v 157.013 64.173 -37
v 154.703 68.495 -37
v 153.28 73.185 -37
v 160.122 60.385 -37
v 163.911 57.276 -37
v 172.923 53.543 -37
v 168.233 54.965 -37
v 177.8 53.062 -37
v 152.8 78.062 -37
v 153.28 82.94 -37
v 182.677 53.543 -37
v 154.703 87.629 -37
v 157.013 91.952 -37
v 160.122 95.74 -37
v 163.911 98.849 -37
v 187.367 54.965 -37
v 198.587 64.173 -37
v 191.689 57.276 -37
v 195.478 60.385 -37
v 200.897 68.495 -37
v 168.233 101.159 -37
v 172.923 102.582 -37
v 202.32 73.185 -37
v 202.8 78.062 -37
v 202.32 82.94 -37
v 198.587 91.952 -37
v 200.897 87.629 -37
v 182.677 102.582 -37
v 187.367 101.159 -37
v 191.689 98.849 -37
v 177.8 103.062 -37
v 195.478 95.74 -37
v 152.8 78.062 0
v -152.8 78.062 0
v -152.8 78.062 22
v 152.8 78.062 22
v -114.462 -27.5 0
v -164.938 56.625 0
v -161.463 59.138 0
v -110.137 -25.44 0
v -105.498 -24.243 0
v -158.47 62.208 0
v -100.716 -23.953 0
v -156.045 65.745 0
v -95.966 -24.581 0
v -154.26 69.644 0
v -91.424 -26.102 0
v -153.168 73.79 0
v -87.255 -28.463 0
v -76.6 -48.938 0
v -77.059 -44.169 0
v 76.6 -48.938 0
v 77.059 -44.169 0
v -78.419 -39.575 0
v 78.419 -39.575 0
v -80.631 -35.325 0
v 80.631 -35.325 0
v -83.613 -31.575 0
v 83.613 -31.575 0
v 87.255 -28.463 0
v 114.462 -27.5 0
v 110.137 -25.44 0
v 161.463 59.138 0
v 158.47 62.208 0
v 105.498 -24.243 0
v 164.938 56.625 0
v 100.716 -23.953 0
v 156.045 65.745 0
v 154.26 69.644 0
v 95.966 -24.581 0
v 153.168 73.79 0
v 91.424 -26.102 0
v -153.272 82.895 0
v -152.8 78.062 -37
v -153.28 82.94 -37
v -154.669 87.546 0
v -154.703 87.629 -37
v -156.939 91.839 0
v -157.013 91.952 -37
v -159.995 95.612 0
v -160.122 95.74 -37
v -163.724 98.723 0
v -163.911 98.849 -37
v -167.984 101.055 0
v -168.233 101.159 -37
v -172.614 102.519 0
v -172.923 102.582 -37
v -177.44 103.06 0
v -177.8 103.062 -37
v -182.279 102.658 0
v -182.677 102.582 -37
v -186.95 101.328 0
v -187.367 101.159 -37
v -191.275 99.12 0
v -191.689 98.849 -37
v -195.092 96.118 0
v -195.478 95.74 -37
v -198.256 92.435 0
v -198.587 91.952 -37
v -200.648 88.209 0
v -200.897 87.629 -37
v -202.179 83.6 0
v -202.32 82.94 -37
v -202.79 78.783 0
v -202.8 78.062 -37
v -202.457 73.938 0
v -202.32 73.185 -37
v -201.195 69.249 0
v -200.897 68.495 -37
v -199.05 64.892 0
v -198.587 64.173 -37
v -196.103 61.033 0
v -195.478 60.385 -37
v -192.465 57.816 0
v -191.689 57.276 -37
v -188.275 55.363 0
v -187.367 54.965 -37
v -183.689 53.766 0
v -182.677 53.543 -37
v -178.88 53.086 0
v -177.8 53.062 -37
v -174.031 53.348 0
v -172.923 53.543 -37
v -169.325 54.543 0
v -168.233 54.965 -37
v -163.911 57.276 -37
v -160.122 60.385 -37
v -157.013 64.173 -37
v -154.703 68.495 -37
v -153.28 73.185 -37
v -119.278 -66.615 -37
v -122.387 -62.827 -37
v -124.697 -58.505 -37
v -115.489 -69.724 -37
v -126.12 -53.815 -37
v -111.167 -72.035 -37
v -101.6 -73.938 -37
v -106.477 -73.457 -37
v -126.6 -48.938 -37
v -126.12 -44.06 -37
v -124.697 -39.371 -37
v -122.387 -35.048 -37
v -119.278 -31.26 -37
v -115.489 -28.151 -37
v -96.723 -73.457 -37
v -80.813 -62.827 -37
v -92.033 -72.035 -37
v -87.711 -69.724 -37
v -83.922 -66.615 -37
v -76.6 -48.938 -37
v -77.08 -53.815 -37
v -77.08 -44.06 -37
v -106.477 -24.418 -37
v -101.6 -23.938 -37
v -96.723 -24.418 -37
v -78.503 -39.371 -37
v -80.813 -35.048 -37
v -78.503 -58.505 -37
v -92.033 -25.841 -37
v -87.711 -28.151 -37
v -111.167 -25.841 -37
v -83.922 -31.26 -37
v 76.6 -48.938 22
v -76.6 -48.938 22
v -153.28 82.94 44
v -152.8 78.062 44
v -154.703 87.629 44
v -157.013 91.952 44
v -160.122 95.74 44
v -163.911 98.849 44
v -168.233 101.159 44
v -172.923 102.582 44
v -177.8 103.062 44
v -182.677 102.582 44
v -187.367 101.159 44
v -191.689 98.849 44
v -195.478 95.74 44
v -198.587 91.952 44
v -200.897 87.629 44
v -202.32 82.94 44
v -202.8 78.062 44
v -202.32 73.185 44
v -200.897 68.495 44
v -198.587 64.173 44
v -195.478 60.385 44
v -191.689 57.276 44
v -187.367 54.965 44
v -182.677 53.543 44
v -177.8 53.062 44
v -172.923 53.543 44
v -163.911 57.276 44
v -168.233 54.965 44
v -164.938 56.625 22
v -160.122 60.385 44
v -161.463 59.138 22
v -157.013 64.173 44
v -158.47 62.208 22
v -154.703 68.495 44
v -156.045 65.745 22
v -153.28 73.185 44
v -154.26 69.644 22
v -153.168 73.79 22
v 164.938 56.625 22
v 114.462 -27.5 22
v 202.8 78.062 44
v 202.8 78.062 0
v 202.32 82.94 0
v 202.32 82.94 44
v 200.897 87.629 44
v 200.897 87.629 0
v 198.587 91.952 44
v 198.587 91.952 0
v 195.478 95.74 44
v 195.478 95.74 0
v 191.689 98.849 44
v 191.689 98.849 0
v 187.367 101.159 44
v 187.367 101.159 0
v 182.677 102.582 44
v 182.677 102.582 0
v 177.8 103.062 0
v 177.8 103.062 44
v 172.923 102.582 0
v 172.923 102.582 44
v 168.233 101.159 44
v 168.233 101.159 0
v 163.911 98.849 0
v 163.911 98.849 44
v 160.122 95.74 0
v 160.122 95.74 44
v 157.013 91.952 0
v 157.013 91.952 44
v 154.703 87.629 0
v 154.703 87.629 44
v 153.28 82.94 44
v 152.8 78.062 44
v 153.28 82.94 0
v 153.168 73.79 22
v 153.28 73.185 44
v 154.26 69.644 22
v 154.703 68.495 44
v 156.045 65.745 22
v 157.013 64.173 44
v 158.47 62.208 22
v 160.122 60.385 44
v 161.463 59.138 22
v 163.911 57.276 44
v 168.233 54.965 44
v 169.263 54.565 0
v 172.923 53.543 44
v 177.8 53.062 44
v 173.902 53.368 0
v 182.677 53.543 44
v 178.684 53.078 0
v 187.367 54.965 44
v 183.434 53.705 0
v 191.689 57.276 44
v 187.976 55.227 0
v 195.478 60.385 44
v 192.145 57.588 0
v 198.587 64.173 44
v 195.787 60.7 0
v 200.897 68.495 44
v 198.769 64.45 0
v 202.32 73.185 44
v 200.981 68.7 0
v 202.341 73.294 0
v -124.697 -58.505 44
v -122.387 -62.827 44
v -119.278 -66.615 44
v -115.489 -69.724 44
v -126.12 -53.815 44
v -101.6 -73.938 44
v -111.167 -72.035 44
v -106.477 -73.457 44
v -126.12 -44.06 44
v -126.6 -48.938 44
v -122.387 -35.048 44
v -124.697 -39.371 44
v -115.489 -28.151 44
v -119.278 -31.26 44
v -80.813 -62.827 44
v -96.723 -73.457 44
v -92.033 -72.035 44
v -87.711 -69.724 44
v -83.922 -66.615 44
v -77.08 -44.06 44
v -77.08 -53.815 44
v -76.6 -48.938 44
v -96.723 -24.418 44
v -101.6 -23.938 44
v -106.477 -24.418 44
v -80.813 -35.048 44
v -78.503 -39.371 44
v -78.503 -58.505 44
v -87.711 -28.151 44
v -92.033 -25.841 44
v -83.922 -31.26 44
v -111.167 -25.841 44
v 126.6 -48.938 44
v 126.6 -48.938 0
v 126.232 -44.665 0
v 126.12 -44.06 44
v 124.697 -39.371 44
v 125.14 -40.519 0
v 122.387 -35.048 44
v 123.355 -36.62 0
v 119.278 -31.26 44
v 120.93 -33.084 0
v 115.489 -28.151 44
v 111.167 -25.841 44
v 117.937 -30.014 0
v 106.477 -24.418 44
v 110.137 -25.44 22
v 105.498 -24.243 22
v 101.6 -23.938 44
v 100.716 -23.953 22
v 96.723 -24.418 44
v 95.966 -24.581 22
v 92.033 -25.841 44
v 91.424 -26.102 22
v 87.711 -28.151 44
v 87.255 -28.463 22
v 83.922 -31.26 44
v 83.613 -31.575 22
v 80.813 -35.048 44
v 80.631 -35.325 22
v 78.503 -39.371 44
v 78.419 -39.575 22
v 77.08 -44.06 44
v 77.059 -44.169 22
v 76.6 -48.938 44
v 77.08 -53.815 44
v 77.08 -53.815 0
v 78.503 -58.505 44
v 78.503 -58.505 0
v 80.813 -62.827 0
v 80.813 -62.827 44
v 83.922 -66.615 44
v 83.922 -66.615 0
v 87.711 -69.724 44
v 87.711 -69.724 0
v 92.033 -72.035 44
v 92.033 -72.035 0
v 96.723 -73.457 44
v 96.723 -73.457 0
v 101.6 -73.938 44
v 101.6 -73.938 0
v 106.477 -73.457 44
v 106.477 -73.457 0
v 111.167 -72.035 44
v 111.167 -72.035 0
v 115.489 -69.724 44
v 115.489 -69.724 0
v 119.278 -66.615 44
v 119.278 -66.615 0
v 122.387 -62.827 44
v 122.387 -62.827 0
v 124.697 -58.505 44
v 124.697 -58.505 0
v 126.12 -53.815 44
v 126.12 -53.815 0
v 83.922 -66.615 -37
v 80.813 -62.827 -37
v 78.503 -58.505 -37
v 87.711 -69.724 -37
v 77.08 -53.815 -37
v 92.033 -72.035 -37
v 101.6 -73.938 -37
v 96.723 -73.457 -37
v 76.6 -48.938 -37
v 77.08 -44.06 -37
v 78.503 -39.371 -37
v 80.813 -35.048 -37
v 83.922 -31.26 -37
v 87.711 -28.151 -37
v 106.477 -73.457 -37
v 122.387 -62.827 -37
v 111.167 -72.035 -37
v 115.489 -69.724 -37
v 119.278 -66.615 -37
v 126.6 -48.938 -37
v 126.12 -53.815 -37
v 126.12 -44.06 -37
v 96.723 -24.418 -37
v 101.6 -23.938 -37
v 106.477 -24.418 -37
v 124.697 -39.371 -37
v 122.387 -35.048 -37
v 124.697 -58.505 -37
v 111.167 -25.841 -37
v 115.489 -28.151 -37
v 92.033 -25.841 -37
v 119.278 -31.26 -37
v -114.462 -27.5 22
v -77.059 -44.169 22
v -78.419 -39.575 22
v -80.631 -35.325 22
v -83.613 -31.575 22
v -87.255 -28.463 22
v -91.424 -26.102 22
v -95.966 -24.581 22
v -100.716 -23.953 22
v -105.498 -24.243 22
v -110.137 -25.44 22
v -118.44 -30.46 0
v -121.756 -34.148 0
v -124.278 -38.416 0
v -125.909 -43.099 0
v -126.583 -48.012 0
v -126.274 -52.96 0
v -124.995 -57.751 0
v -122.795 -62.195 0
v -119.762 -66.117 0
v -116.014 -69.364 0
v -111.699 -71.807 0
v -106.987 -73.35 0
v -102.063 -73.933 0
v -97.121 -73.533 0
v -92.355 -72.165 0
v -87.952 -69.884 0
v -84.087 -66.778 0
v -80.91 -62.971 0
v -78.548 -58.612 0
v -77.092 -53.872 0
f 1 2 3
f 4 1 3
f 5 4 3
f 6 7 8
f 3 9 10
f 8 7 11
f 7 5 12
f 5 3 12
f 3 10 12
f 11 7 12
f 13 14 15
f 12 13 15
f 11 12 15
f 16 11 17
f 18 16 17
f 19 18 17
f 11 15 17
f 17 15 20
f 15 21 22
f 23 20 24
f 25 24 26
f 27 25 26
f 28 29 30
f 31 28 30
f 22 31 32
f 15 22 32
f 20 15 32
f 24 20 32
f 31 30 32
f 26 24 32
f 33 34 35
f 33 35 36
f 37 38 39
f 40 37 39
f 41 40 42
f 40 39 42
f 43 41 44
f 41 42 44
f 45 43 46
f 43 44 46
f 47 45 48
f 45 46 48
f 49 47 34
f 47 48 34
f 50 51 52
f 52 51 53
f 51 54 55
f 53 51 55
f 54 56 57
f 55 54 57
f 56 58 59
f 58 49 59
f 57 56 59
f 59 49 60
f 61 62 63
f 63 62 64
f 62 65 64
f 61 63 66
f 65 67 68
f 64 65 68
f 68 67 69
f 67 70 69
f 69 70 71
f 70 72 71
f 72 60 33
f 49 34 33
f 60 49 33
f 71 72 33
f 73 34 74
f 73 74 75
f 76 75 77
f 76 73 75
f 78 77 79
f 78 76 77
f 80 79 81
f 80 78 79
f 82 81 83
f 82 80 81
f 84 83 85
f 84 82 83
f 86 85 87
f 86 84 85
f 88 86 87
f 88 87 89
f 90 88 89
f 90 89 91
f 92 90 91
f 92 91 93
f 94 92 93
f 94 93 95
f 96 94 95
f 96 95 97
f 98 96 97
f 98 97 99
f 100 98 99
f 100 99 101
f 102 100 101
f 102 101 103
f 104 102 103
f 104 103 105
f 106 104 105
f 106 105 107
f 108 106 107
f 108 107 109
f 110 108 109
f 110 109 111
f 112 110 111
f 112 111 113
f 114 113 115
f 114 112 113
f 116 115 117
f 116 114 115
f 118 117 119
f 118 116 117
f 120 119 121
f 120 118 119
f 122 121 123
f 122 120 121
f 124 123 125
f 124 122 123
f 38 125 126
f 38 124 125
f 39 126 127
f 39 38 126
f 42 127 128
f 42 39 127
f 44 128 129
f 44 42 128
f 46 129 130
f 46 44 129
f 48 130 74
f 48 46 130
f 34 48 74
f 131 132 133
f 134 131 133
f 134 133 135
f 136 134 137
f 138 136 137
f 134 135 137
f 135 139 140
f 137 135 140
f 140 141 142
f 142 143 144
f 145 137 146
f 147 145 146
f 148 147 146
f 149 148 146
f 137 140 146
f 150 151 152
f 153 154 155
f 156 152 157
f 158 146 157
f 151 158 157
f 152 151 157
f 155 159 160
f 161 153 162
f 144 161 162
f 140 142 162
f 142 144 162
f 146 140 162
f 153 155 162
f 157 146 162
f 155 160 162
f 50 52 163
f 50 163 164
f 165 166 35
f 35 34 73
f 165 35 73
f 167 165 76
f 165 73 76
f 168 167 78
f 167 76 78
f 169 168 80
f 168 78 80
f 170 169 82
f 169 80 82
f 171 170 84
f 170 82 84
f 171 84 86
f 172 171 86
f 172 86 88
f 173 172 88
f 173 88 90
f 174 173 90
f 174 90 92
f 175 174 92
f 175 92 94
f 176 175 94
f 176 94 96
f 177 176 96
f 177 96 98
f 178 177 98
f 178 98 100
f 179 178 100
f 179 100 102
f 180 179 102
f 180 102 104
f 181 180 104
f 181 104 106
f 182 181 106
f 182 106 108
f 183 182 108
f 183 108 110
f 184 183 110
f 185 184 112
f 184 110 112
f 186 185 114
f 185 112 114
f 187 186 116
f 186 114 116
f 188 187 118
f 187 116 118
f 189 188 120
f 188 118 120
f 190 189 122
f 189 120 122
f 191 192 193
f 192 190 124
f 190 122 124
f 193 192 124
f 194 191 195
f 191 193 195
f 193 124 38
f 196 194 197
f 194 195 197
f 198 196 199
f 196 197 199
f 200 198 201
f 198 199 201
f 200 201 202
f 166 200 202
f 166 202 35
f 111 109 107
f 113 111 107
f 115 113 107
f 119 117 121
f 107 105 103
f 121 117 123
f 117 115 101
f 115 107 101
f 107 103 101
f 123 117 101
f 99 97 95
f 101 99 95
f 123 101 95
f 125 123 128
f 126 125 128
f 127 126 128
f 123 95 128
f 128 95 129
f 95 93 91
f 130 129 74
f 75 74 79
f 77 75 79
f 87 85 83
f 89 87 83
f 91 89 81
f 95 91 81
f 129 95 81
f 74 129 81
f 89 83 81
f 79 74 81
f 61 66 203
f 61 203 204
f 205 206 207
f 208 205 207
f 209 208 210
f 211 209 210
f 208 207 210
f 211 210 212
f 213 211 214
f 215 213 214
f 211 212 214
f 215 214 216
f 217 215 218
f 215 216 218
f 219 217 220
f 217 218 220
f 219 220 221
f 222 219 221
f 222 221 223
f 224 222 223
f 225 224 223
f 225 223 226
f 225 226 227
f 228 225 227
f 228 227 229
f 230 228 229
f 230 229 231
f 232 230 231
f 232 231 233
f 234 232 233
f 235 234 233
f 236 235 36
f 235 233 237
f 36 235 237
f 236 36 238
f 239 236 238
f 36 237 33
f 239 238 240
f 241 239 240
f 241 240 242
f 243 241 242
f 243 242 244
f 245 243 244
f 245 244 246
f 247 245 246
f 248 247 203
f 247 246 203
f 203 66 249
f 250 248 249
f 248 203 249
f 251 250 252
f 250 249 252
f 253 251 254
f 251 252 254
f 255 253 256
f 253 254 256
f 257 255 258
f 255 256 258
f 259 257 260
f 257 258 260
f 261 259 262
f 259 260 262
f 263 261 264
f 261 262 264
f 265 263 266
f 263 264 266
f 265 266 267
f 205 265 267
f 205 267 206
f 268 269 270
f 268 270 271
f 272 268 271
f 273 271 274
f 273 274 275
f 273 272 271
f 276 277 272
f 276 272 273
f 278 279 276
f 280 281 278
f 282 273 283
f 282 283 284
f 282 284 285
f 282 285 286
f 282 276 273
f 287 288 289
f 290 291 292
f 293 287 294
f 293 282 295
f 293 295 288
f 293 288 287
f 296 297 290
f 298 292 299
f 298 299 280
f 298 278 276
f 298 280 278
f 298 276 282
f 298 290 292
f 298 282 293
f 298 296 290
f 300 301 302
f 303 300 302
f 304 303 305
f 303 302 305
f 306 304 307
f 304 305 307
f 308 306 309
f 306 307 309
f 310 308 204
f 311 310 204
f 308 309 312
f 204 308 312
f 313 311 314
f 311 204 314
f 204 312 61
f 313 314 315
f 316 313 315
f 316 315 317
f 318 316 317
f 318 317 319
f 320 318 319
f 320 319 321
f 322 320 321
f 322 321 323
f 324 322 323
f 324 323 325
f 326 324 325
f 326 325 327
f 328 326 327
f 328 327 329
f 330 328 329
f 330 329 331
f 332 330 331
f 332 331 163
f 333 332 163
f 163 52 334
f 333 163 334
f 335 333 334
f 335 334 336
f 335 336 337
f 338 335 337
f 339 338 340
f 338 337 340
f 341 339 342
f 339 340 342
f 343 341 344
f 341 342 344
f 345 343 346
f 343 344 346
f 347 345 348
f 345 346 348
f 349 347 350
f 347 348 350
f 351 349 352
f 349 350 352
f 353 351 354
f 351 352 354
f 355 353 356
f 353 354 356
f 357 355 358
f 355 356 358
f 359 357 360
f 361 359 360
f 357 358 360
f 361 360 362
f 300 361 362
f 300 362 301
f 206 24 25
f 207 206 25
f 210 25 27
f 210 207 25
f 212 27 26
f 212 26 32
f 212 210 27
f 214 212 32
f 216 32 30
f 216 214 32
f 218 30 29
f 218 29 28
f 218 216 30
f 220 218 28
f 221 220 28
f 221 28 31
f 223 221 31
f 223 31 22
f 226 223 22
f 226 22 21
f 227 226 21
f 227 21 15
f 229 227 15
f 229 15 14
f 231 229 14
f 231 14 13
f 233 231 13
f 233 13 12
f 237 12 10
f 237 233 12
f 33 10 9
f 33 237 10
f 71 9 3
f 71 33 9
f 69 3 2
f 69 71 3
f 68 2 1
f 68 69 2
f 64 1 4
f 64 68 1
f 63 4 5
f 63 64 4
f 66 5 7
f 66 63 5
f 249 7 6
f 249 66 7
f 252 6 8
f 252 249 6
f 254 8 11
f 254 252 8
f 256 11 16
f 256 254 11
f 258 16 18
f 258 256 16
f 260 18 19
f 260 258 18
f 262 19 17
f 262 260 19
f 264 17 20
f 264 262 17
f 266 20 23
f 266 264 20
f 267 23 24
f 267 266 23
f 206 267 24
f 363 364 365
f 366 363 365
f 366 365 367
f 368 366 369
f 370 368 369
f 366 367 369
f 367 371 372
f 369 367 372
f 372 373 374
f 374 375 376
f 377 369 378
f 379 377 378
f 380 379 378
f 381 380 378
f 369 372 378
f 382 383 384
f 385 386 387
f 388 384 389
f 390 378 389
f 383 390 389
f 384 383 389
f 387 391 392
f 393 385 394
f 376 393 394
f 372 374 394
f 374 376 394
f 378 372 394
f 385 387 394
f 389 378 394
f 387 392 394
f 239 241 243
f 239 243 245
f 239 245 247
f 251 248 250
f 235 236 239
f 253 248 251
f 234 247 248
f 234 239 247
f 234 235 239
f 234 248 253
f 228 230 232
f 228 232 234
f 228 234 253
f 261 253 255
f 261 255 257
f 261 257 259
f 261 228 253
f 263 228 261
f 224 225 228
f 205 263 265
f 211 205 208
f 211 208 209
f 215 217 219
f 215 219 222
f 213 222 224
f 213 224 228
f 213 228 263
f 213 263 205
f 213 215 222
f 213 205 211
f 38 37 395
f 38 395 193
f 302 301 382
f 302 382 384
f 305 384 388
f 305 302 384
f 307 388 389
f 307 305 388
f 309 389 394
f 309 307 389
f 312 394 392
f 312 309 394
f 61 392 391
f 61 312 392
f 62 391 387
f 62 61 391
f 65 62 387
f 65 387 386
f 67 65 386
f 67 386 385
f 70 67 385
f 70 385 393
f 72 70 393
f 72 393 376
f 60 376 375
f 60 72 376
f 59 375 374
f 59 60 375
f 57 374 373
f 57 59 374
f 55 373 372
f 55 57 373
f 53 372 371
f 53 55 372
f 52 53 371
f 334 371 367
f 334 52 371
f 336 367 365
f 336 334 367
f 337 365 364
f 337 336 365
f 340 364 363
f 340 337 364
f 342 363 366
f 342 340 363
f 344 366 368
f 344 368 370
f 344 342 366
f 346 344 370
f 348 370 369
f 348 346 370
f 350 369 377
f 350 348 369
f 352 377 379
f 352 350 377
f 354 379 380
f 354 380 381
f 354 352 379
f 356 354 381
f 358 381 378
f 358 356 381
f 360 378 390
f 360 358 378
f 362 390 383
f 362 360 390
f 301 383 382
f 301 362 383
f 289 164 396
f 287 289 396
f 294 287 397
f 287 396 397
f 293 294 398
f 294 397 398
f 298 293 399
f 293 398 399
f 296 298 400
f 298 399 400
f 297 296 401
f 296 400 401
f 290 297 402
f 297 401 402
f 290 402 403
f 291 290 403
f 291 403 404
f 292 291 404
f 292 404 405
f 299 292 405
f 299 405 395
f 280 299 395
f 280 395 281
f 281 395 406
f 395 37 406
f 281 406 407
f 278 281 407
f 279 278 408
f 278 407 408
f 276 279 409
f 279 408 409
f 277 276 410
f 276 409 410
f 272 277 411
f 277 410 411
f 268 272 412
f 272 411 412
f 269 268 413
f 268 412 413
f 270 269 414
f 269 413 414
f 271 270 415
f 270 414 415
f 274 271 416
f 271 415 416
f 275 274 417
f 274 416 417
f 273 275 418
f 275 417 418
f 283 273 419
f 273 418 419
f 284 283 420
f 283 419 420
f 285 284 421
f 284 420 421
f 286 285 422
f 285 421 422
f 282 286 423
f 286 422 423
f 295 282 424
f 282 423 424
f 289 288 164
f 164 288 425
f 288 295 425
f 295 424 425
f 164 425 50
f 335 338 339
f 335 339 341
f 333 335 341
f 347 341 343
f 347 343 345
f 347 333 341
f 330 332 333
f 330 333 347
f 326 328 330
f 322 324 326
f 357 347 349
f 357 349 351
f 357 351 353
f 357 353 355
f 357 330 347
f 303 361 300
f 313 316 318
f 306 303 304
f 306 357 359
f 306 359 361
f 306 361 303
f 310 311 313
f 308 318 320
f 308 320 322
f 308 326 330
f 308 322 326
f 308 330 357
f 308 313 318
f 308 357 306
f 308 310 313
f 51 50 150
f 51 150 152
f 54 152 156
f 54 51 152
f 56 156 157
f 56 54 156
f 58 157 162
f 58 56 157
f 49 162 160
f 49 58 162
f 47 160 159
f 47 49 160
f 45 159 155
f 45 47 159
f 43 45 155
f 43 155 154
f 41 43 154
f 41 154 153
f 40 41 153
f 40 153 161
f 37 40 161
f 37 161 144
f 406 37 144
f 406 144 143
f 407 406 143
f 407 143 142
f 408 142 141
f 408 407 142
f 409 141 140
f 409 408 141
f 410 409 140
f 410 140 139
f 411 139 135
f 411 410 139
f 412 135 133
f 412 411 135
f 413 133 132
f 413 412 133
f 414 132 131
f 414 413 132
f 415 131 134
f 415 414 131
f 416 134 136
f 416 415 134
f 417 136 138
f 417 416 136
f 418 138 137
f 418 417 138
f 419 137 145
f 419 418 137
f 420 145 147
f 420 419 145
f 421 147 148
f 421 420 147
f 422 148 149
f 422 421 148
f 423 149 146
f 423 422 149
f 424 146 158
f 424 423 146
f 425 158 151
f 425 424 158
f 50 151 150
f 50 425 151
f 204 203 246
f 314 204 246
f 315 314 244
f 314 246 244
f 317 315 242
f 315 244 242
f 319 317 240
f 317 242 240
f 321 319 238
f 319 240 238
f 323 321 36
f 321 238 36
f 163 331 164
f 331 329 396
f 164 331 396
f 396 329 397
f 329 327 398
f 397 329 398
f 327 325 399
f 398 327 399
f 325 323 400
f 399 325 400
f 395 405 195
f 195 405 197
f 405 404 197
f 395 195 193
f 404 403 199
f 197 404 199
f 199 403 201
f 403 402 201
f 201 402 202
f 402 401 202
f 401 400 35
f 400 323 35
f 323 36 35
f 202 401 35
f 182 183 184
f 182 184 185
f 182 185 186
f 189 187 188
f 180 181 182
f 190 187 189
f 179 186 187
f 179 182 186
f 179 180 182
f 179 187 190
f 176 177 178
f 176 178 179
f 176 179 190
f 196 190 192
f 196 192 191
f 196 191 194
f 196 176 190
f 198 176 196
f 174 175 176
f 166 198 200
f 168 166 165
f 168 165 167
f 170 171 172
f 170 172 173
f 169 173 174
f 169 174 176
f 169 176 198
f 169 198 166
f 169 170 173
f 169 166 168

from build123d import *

# Parameters (mm, degrees)
BOSS_EXTRUDE1_DEPTH      = 22
BOSS_EXTRUDE2_DEPTH      = 44
BOSS_EXTRUDE2_DEPTH_BACK = 37
SKETCH1_3_R              = 25


with BuildPart() as part:
    # Sketch1 → Boss-Extrude1 (new body)
    with BuildSketch(Plane.XY):
        Polygon((-177.8, 78.062396106), (177.8, 78.062396106), (101.6, -48.937603894), (-101.6, -48.937603894), align=None)
    extrude(amount=BOSS_EXTRUDE1_DEPTH)

    # Sketch1<3> → Boss-Extrude2 (add, two sides: drawn at the far end of the back side and taken through both)
    with BuildSketch(Plane.XY.offset(-BOSS_EXTRUDE2_DEPTH_BACK)):
        with Locations((177.8, 78.062396106)):
            Circle(SKETCH1_3_R)
        with Locations((101.6, -48.937603894)):
            Circle(SKETCH1_3_R)
        with Locations((-101.6, -48.937603894)):
            Circle(SKETCH1_3_R)
        with Locations((-177.8, 78.062396106)):
            Circle(SKETCH1_3_R)
    extrude(amount=BOSS_EXTRUDE2_DEPTH + BOSS_EXTRUDE2_DEPTH_BACK)


solid = part.part
